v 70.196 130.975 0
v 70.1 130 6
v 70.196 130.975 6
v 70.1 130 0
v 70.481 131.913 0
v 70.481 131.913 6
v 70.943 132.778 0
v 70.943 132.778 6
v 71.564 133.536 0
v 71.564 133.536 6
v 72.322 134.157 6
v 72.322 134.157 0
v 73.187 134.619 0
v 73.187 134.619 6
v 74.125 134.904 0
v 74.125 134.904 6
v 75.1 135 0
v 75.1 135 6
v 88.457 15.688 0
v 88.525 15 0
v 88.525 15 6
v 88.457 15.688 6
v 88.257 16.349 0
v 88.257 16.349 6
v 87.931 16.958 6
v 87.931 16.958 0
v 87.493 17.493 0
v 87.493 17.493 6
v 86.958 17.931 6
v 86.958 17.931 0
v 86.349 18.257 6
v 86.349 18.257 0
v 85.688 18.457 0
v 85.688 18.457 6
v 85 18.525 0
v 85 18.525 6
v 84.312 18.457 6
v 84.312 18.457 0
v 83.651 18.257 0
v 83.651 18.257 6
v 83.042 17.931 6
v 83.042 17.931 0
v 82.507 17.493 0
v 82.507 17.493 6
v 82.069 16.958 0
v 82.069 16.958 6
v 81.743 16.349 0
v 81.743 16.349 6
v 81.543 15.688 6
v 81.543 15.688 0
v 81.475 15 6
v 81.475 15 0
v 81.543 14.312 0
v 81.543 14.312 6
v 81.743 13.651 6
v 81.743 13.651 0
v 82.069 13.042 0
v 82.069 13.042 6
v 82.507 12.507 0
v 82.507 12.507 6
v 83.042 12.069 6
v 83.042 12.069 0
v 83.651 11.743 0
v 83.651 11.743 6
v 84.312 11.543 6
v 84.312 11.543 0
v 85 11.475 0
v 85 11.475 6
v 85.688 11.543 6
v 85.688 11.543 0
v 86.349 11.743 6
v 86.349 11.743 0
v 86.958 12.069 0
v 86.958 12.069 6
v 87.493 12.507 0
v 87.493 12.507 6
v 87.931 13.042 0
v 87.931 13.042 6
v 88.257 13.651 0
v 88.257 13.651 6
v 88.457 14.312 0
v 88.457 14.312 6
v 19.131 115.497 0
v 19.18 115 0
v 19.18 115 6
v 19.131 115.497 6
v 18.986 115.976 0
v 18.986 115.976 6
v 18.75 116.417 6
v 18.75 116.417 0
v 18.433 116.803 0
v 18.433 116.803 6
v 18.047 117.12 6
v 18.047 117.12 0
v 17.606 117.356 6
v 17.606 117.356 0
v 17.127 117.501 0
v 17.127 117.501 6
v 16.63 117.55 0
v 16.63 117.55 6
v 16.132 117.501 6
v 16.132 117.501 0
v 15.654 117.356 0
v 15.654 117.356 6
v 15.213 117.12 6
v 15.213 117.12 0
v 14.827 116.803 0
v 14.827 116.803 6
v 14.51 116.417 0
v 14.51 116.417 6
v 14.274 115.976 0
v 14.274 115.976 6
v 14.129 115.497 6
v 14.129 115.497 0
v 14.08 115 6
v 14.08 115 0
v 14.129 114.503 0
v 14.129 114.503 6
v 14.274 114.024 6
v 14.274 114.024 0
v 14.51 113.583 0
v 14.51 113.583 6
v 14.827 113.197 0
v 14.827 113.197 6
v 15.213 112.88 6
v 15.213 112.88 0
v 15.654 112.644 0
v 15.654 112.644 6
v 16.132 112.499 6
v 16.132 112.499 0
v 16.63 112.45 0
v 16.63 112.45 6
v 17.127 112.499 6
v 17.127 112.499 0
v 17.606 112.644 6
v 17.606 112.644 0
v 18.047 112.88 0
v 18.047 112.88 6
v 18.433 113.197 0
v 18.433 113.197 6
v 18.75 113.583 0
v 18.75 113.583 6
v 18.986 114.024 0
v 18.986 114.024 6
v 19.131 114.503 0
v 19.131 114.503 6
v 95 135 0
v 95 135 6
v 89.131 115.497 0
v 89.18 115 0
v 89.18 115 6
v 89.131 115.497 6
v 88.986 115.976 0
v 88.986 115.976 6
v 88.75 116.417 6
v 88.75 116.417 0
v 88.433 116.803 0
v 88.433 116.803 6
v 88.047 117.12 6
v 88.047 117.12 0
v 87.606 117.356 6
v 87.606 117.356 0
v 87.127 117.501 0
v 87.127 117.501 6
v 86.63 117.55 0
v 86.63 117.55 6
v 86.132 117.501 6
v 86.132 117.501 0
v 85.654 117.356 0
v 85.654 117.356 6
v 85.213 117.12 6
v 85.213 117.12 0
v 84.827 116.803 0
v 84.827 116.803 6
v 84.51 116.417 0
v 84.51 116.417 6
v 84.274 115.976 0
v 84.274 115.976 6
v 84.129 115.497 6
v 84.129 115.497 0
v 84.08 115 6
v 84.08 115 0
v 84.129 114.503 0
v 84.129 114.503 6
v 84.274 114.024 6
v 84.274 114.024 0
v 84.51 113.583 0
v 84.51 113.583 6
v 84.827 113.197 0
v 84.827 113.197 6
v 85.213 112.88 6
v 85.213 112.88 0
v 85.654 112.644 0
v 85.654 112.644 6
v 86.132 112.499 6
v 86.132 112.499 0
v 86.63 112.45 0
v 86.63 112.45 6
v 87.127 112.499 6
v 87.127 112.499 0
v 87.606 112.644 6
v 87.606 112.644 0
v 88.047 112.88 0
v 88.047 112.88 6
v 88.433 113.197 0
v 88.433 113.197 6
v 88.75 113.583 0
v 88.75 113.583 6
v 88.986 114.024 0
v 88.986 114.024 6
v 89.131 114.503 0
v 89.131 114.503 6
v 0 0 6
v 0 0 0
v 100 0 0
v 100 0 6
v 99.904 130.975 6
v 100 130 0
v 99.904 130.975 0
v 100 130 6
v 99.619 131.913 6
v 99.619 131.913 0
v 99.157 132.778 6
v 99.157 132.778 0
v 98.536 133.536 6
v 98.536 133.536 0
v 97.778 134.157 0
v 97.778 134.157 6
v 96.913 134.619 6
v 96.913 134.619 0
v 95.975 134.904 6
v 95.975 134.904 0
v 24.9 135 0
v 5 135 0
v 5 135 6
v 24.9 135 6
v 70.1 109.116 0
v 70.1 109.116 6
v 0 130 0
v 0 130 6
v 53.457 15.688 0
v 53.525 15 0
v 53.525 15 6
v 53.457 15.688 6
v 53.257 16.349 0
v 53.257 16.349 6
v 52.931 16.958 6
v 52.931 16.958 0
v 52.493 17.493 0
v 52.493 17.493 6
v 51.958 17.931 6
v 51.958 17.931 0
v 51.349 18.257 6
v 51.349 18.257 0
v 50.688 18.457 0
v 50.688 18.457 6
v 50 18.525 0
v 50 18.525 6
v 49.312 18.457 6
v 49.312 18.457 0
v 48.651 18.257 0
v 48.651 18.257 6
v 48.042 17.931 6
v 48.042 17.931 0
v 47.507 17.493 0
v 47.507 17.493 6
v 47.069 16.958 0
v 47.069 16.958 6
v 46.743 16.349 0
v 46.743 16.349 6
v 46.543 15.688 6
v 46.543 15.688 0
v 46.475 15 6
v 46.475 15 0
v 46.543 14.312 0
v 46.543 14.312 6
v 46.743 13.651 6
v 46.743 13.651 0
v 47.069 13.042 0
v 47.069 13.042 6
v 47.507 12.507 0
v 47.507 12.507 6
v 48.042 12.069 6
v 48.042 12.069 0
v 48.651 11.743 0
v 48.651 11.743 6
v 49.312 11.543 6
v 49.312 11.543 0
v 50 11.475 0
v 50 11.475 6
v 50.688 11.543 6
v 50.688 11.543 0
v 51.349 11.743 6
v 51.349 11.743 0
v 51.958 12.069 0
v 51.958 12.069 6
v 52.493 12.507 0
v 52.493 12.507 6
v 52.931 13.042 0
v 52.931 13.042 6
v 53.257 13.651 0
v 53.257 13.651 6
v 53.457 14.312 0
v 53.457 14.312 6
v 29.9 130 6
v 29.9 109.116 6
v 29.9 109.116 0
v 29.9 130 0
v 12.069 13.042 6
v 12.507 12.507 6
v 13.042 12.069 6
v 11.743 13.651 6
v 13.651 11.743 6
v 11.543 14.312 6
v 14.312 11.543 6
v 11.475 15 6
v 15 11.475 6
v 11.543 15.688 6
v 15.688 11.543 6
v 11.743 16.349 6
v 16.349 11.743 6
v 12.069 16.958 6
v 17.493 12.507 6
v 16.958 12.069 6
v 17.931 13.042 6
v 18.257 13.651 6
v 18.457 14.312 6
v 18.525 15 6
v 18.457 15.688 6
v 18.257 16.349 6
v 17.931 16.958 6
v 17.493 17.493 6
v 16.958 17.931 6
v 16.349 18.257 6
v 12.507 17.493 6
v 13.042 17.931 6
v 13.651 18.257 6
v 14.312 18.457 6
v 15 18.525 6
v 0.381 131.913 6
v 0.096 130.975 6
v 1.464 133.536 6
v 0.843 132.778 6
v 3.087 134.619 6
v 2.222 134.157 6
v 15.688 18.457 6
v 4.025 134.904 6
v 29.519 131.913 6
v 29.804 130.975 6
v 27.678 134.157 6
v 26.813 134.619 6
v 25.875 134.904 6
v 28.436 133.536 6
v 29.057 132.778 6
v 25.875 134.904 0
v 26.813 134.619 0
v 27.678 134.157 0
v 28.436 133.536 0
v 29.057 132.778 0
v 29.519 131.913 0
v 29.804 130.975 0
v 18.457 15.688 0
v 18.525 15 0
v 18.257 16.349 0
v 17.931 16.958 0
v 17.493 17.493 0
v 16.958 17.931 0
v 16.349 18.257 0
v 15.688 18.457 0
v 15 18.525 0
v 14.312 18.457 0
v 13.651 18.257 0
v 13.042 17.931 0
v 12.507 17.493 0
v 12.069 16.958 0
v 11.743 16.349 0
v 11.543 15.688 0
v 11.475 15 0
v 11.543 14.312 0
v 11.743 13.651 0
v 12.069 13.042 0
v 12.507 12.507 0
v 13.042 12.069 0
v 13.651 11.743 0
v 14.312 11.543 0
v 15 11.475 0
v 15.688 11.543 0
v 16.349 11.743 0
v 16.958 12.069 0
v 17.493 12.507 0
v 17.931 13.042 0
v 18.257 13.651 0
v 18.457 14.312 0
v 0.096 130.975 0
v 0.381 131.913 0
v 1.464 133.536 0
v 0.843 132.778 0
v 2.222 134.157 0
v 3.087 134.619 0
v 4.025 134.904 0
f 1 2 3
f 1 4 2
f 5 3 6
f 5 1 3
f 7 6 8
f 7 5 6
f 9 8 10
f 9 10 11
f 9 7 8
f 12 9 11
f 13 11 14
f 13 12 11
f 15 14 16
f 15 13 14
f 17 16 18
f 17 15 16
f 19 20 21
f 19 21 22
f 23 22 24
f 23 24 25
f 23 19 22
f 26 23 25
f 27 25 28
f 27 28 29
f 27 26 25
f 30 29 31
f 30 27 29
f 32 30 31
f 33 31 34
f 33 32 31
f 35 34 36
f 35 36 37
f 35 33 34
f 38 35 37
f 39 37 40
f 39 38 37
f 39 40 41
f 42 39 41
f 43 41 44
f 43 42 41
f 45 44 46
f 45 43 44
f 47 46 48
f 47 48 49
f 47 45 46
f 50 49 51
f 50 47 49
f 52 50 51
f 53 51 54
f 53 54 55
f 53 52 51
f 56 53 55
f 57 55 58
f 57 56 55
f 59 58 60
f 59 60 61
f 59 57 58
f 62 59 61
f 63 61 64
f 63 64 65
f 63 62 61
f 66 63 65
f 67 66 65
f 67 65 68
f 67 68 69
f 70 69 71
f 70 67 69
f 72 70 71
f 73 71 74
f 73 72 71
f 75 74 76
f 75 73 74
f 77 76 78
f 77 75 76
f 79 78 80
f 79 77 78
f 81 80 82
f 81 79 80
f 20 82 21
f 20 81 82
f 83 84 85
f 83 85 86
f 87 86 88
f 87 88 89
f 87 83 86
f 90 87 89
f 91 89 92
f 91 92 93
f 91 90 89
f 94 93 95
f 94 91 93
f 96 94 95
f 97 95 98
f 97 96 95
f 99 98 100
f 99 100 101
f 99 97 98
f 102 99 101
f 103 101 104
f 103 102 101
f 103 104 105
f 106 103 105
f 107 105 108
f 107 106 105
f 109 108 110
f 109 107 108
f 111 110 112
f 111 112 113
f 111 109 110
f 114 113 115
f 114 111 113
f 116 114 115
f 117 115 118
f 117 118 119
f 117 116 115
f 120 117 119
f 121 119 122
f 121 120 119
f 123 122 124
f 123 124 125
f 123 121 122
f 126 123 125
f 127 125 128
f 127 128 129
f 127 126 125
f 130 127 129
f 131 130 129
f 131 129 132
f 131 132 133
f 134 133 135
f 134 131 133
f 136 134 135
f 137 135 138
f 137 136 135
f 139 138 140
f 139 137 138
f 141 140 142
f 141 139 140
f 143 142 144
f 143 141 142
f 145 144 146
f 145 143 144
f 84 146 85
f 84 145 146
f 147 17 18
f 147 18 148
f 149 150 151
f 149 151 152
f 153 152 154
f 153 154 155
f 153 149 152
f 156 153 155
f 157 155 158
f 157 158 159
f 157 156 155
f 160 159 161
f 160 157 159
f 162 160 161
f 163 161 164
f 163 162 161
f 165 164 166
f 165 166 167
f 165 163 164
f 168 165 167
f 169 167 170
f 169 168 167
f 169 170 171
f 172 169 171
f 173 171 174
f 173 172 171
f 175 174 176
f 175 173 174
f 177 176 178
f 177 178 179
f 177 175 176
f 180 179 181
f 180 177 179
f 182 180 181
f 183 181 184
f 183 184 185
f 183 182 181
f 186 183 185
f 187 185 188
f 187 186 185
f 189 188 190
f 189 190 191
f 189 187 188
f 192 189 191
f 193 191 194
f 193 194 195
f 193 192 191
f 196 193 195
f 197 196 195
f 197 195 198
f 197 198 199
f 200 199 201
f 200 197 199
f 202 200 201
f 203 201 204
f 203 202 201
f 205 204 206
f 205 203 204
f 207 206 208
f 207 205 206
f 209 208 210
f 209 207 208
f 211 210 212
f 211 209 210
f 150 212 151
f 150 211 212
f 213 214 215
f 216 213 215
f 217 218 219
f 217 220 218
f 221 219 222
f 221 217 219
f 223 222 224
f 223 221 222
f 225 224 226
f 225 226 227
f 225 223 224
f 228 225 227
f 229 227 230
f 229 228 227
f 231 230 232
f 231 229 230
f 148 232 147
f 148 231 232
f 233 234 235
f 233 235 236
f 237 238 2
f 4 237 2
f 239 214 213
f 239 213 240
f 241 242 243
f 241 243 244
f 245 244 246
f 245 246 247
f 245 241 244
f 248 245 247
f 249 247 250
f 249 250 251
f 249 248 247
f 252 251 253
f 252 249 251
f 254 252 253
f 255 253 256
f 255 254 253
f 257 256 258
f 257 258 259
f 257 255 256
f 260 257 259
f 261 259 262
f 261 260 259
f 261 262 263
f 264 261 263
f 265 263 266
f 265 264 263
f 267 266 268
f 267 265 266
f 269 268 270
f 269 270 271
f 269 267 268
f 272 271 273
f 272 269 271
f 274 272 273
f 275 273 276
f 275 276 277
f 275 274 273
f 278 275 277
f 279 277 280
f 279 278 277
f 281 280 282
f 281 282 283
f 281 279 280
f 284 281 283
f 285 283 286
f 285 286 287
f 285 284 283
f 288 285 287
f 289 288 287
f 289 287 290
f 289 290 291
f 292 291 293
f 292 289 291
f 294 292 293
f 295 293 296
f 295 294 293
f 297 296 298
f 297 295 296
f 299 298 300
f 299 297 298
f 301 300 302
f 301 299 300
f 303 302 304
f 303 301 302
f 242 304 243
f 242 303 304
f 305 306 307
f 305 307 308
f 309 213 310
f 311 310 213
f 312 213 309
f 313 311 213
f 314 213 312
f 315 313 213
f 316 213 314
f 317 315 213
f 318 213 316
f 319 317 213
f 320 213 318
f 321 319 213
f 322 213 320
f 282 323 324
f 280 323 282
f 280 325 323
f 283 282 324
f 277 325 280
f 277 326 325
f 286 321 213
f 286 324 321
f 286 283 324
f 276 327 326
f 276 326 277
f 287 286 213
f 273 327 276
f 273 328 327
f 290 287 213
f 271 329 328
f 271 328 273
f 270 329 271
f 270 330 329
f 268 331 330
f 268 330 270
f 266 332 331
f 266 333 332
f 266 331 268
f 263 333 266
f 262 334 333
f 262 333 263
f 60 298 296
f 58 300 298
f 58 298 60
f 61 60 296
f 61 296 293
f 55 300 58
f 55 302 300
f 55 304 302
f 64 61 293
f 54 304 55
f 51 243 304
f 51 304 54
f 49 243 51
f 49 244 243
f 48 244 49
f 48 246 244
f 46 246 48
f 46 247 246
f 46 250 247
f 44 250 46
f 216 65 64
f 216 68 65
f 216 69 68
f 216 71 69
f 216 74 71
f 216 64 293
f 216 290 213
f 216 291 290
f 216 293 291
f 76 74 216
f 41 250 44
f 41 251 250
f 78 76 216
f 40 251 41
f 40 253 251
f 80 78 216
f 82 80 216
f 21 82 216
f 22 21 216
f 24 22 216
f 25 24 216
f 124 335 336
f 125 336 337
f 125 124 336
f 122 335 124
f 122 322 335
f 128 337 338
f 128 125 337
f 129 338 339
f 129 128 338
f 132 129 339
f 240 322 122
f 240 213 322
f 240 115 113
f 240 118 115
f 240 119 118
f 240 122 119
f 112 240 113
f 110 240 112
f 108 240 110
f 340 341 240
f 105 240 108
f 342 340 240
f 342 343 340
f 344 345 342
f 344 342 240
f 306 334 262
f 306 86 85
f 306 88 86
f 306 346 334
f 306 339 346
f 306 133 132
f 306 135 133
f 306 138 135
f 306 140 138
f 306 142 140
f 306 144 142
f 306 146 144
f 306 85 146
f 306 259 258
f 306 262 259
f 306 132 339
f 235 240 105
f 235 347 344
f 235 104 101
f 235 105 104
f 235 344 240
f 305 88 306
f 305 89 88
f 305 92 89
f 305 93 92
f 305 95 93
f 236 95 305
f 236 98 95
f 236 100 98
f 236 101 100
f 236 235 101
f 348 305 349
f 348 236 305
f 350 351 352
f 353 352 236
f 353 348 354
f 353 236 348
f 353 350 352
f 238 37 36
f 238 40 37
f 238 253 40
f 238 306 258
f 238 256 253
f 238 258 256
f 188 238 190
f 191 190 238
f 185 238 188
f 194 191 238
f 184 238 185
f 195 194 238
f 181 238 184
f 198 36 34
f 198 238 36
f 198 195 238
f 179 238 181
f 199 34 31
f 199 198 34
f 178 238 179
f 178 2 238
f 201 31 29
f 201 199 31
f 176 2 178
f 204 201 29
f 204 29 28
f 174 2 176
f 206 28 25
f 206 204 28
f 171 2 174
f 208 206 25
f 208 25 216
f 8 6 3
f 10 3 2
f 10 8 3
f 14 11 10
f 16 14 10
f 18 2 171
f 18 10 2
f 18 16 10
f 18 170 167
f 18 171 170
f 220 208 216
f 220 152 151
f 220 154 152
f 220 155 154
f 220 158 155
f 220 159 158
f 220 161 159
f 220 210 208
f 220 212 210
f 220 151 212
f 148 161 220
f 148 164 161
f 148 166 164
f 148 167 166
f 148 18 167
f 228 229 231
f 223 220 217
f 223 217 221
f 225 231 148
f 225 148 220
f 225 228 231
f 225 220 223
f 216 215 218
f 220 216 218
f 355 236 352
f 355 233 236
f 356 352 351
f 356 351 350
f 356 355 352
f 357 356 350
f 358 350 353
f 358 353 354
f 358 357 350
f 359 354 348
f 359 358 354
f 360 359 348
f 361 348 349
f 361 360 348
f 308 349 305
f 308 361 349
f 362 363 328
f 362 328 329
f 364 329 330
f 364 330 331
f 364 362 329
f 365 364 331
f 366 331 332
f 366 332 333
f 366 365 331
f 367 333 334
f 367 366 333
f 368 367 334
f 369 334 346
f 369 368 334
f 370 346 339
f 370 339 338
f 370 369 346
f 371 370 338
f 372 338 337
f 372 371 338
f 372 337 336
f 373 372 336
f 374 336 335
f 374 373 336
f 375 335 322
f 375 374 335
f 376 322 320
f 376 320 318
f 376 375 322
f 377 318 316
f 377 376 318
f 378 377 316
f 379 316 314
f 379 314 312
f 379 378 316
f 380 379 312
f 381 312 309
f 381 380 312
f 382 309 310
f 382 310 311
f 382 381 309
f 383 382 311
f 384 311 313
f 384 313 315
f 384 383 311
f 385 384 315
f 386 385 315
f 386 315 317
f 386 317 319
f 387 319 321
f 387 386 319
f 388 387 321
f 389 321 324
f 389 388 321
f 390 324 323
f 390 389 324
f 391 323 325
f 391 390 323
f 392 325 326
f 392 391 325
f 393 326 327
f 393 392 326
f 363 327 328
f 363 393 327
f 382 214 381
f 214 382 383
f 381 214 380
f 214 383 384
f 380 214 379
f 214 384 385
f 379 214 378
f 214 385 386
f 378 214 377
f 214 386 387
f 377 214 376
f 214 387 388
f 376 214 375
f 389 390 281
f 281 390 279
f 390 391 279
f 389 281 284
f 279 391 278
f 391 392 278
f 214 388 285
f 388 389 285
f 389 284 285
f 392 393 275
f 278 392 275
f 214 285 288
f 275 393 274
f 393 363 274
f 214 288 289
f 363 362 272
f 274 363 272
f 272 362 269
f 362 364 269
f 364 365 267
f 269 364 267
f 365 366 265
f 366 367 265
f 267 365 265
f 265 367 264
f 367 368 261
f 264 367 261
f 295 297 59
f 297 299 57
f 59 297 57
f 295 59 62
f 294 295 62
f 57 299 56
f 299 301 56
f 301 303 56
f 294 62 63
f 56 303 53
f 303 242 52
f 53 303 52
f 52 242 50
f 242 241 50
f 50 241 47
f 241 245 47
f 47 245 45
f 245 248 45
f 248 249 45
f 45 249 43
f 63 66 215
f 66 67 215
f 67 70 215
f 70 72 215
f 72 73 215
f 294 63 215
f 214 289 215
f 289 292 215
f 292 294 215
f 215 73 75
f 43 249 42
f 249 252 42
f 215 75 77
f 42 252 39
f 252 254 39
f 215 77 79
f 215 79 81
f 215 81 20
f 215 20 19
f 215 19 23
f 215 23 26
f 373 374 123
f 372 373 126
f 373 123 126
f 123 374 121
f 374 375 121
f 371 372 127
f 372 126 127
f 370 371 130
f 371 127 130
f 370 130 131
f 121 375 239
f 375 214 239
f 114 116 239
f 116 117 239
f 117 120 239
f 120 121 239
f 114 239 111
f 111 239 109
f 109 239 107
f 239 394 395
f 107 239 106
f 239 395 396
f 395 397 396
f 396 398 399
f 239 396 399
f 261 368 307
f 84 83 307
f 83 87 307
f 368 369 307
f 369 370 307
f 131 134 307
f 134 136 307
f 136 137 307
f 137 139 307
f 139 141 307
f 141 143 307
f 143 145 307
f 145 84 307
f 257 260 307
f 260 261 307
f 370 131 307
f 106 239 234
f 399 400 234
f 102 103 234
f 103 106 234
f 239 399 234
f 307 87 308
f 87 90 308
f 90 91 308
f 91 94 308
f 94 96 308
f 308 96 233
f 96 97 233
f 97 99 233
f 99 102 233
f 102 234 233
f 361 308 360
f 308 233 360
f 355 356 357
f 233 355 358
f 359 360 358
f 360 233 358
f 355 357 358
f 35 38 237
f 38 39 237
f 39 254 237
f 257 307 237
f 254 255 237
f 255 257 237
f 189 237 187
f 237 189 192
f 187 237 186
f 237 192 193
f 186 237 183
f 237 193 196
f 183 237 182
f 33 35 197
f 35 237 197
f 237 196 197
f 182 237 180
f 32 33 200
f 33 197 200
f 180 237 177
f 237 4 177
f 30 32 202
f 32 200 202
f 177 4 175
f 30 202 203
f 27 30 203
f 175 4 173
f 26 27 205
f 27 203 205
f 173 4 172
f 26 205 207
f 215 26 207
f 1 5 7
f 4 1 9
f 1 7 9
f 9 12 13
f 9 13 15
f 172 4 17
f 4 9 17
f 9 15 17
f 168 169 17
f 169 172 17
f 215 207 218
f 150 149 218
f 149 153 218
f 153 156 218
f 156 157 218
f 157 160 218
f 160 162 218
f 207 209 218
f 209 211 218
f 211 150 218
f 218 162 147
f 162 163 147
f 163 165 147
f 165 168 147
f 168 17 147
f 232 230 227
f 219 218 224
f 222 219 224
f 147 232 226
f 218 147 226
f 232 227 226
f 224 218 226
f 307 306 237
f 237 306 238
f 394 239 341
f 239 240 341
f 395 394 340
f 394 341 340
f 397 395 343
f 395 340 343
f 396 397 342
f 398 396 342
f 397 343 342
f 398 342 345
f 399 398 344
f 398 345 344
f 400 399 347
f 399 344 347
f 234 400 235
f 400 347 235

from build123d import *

# Parameters (mm, degrees)
SKETCH_1_W   = 100
SKETCH_1_H   = 135
SKETCH_1_R   = 3.525
SKETCH_1_R_2 = 2.55
PAD_DEPTH    = 6
SKETCH_W     = 40.2
SKETCH_H     = 28.5
POCKET_DEPTH = 6
FILLET_R     = 5


with BuildPart() as part:
    # Sketch_1 → Pad (new body)
    with BuildSketch(Plane.XY):
        with Locations((50, 67.5)):
            Rectangle(SKETCH_1_W, SKETCH_1_H)
        with Locations((15, 15)):
            Circle(SKETCH_1_R, mode=Mode.SUBTRACT)
        with Locations((50, 15)):
            Circle(SKETCH_1_R, mode=Mode.SUBTRACT)
        with Locations((85, 15)):
            Circle(SKETCH_1_R, mode=Mode.SUBTRACT)
        with Locations((16.629946, 115)):
            Circle(SKETCH_1_R_2, mode=Mode.SUBTRACT)
        with Locations((86.629946, 115)):
            Circle(SKETCH_1_R_2, mode=Mode.SUBTRACT)
    extrude(amount=PAD_DEPTH)

    # Sketch (on Face11 of Pad) → Pocket (cut)
    with BuildSketch(Plane.XY.offset(6)):
        with Locations((50, 123.366165)):
            Rectangle(SKETCH_W, SKETCH_H)
    extrude(amount=-POCKET_DEPTH, mode=Mode.SUBTRACT)

    # Fillet
    fillet_edges = [part.edges().sort_by_distance(p)[0] for p in [
        (0, 135, 3),
        (29.9, 135, 3),
        (70.1, 135, 3),
        (100, 135, 3),
    ]]
    fillet(fillet_edges, radius=FILLET_R)


solid = part.part
